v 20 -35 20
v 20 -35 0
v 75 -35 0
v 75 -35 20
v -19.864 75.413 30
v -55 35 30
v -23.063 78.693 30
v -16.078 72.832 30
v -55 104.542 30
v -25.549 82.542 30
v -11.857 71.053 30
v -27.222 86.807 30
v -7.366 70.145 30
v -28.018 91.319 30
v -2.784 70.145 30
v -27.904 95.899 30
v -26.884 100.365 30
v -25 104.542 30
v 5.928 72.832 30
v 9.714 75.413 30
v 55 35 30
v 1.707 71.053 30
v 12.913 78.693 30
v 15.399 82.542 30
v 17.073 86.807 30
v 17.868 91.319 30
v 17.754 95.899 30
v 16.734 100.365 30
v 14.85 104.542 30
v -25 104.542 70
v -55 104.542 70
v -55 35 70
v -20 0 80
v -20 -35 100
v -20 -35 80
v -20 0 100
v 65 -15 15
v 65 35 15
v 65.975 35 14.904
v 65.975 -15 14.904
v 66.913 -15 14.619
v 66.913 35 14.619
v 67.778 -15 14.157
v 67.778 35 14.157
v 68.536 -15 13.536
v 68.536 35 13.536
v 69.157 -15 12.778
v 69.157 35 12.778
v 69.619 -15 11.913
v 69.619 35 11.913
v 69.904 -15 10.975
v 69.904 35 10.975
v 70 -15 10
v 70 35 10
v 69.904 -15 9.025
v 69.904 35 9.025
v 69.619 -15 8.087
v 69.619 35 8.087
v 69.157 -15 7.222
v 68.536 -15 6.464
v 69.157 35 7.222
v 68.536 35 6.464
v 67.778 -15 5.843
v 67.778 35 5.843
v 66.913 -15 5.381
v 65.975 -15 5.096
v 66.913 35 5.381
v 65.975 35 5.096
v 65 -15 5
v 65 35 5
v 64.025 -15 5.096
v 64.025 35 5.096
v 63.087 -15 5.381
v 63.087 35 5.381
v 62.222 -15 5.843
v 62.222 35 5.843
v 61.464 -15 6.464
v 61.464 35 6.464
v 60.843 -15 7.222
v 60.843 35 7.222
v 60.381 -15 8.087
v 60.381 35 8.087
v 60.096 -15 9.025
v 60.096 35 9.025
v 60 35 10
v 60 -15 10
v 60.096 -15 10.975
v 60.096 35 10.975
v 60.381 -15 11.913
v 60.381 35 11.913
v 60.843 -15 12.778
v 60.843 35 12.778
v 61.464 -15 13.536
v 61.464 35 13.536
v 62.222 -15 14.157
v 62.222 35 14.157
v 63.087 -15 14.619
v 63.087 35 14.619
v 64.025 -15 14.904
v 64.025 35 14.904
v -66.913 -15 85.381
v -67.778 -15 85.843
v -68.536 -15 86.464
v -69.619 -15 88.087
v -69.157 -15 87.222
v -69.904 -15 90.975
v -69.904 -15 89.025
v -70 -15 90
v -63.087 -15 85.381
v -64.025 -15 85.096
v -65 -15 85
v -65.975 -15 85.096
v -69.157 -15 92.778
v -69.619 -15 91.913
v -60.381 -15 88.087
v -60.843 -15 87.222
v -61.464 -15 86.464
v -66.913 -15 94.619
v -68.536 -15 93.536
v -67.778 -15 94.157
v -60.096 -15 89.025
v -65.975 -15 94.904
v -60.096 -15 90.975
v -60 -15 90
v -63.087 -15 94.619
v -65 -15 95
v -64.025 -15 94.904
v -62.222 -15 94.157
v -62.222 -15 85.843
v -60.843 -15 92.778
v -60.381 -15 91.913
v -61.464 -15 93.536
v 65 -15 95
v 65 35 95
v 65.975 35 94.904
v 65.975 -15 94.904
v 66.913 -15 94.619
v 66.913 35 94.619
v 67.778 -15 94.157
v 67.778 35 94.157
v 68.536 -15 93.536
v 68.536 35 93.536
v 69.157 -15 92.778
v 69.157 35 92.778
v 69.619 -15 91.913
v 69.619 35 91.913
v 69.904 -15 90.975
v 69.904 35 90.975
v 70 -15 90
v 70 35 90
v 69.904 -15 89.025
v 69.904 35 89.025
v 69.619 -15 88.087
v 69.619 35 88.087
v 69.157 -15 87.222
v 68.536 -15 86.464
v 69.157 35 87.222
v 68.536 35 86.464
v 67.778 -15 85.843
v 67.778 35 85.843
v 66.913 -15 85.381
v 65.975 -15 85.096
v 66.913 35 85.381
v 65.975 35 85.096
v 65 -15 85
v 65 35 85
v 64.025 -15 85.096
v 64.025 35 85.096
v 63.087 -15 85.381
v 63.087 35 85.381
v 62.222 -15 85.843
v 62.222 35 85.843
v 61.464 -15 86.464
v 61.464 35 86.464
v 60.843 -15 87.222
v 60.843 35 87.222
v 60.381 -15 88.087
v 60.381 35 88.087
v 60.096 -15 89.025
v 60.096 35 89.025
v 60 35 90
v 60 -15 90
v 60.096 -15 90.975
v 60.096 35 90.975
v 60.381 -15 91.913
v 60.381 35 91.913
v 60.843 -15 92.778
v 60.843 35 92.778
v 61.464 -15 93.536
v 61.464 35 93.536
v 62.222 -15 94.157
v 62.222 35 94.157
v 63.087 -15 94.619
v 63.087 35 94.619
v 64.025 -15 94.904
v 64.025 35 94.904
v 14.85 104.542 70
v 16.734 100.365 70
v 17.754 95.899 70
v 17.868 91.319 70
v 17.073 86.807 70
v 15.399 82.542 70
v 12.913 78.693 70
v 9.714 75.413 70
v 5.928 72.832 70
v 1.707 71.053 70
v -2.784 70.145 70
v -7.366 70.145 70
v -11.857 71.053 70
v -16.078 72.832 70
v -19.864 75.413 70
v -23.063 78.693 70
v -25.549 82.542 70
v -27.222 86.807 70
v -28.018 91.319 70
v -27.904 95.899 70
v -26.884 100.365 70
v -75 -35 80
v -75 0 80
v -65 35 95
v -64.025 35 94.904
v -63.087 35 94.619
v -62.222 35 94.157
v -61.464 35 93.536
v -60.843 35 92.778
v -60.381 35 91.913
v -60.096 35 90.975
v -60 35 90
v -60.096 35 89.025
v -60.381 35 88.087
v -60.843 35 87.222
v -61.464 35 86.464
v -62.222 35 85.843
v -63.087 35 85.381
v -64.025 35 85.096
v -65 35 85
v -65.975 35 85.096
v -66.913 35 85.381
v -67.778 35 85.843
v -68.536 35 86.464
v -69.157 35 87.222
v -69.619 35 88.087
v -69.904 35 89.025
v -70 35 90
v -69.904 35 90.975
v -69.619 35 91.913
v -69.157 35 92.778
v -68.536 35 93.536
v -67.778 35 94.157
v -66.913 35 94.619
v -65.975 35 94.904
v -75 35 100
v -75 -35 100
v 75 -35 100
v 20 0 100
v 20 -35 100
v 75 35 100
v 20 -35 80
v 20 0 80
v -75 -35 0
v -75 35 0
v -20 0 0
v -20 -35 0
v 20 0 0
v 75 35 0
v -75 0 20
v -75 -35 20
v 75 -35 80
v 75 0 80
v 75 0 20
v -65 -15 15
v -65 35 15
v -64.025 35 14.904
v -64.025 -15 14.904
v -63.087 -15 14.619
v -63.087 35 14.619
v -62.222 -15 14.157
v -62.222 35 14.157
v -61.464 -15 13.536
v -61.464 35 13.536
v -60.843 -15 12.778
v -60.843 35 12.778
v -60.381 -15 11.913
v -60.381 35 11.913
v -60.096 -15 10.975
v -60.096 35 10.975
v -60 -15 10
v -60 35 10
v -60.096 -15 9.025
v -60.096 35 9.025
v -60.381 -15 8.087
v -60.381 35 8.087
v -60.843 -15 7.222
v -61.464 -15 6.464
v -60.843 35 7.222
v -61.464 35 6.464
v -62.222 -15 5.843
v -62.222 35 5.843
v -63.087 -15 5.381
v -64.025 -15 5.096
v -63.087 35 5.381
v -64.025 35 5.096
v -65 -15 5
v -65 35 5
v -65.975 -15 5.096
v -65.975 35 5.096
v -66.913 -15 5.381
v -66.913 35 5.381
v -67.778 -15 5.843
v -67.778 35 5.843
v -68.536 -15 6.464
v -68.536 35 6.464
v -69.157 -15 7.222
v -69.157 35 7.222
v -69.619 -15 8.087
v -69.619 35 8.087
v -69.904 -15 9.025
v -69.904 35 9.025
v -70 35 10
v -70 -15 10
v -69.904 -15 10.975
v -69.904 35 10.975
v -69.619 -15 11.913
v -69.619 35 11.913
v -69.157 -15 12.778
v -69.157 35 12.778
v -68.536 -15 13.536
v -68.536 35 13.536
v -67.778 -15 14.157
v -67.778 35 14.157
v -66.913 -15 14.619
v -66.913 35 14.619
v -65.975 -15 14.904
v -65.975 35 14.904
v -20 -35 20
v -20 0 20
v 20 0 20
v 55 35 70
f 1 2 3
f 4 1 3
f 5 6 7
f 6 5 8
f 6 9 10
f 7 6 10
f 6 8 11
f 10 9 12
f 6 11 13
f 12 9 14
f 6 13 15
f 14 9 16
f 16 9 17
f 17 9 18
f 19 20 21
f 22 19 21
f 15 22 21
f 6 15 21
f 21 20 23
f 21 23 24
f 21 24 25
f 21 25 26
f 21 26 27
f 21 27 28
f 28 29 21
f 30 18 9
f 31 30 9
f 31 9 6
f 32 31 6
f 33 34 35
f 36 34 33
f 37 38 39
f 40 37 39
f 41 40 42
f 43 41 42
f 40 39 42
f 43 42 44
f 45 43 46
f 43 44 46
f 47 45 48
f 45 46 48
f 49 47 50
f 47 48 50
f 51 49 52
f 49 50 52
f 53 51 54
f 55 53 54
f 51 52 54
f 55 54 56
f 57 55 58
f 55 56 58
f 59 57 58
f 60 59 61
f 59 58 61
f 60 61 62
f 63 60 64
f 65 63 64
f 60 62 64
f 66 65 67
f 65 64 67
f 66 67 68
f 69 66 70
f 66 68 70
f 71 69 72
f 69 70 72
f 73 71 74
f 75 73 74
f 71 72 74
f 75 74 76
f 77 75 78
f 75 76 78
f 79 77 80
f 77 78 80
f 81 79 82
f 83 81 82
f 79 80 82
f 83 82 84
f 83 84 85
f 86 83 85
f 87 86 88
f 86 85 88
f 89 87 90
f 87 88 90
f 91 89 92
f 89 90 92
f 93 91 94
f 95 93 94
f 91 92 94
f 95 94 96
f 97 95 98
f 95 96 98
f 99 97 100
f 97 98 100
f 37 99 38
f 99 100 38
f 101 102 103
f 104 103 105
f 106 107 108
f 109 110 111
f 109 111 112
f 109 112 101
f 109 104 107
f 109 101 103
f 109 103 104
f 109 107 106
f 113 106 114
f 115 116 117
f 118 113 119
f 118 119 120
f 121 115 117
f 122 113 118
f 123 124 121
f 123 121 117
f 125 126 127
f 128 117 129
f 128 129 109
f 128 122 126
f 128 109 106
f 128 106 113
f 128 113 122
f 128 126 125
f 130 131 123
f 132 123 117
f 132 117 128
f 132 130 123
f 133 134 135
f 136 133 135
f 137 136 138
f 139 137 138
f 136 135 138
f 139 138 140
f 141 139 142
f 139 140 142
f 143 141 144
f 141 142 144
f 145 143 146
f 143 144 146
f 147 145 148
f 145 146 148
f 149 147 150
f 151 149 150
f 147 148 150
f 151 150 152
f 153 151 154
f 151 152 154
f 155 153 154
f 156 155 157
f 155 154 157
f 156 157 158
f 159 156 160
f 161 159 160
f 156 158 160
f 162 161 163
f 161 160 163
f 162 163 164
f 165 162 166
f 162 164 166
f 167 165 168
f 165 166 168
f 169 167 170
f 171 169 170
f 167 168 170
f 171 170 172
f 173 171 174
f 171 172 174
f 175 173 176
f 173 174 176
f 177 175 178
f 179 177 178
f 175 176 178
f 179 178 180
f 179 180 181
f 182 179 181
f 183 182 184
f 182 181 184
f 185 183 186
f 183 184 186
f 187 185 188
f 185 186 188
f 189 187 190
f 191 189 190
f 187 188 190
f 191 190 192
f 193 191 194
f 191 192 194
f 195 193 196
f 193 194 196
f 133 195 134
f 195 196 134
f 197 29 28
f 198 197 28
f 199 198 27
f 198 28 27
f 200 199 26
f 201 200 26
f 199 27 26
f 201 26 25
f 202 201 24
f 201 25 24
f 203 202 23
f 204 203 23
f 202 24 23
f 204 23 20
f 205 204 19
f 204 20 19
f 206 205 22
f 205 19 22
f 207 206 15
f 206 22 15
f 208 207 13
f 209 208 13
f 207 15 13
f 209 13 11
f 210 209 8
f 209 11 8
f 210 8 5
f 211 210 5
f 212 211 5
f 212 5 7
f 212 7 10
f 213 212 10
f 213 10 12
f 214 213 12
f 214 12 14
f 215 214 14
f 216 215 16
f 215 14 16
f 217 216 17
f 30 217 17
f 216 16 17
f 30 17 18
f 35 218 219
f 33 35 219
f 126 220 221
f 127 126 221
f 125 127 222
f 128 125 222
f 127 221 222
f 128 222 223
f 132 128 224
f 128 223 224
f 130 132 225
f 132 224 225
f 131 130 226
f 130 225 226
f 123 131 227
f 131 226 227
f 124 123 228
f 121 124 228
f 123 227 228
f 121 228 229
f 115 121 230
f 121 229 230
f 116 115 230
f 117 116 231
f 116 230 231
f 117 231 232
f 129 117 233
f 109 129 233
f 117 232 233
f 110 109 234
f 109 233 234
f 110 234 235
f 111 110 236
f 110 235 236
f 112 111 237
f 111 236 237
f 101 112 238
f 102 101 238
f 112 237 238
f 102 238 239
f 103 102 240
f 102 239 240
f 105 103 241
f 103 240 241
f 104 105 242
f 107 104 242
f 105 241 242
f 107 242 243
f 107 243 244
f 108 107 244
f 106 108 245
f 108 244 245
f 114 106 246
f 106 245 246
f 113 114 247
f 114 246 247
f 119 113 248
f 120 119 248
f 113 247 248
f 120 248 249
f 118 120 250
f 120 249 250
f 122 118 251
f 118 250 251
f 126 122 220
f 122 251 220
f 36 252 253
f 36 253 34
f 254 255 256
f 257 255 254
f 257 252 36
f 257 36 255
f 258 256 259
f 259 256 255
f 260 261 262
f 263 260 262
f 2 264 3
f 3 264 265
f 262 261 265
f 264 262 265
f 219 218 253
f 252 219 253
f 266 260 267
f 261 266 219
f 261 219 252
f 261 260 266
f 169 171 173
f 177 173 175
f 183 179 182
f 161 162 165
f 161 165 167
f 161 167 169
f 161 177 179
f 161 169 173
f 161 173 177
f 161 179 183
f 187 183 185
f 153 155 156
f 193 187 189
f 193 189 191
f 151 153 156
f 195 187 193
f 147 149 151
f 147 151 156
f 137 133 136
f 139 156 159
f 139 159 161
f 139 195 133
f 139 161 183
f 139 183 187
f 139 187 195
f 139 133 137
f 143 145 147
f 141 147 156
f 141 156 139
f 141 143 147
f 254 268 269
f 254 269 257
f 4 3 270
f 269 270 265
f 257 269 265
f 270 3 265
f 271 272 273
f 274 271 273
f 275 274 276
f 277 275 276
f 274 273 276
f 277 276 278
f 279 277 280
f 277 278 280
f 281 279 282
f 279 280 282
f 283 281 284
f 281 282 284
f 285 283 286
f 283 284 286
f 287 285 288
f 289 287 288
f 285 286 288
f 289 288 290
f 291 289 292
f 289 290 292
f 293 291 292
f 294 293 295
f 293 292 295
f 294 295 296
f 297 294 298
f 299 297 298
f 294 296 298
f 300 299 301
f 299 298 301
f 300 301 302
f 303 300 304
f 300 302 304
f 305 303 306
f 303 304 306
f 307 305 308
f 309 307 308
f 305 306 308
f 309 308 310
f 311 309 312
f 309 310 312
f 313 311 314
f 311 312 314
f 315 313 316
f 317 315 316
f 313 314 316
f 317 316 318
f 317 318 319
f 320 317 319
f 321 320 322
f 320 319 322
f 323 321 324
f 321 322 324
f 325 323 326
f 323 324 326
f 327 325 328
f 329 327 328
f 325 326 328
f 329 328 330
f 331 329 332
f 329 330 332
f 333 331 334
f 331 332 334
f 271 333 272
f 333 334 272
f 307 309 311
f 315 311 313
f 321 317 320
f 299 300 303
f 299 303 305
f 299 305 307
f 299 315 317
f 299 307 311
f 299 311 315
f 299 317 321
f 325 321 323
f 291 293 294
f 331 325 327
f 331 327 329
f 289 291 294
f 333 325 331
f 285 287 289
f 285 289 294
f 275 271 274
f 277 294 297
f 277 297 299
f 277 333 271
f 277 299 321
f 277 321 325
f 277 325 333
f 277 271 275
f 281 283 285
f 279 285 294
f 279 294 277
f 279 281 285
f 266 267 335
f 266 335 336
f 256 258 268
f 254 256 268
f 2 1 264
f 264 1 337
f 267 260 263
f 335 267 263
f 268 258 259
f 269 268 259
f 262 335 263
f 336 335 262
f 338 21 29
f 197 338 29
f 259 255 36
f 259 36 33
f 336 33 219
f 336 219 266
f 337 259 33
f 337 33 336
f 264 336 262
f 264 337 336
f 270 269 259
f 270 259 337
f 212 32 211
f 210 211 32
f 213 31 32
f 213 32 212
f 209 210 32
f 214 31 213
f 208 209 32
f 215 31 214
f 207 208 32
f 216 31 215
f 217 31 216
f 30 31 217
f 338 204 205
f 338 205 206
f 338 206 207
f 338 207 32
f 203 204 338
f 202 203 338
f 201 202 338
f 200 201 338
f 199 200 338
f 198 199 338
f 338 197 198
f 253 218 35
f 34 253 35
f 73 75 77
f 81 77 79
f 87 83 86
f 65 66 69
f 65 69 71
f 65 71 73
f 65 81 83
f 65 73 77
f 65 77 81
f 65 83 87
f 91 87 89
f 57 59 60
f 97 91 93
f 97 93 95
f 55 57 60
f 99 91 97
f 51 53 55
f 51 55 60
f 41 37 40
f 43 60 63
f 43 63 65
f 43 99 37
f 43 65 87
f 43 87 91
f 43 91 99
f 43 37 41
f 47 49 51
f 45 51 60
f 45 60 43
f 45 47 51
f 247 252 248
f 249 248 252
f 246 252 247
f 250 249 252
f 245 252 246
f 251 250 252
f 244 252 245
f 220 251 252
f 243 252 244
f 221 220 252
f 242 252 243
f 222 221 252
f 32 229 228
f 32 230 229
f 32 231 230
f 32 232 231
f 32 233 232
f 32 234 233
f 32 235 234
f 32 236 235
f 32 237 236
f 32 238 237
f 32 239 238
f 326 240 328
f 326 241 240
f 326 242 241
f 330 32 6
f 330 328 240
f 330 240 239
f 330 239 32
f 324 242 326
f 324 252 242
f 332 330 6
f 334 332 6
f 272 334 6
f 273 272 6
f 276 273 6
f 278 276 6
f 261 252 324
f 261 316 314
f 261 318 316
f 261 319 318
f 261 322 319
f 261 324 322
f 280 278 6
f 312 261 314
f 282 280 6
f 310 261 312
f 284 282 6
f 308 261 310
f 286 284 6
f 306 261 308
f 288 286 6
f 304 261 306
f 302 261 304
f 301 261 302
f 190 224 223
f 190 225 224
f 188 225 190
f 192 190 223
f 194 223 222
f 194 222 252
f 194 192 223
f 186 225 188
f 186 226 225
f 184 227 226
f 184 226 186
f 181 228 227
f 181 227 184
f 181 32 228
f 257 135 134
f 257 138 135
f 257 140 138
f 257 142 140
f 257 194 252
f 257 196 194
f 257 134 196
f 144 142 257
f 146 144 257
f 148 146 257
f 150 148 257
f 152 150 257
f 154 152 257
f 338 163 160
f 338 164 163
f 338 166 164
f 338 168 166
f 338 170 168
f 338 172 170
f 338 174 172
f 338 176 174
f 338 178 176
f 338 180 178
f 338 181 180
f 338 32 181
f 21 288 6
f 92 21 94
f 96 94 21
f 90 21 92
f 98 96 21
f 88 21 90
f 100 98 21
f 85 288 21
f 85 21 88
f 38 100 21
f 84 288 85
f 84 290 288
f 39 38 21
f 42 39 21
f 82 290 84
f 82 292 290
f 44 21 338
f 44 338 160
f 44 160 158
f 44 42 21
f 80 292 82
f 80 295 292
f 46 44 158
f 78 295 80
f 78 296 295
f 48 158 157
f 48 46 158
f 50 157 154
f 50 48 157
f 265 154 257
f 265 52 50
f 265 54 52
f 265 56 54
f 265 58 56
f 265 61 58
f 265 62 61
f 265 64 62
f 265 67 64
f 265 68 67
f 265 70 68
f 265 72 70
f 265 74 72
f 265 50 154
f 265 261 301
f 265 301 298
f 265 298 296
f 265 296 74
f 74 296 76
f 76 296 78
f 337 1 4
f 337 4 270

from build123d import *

# Parameters (mm, degrees)
SKETCH1_W                = 150
SKETCH1_H                = 70
BOSS_EXTRUDE1_DEPTH      = 100
SKETCH2_W                = 40
SKETCH2_H                = 35
CUT_EXTRUDE1_DEPTH       = 100
SKETCH3_W                = 60
SKETCH3_H                = 35
CUT_EXTRUDE2_DEPTH       = 150
BOSS_EXTRUDE2_DEPTH      = 20
BOSS_EXTRUDE2_DEPTH_BACK = 20
SKETCH11_R               = 5
CUT_EXTRUDE4_DEPTH       = 50


with BuildPart() as part:
    # Sketch1 → Boss-Extrude1 (new body)
    with BuildSketch(Plane.XY):
        Rectangle(SKETCH1_W, SKETCH1_H)
    extrude(amount=BOSS_EXTRUDE1_DEPTH)

    # Sketch2 → Cut-Extrude1 (cut)
    with BuildSketch(Plane.XY.offset(100)):
        with Locations((0, -17.5)):
            Rectangle(SKETCH2_W, SKETCH2_H)
    extrude(amount=-CUT_EXTRUDE1_DEPTH, mode=Mode.SUBTRACT)

    # Sketch3 → Cut-Extrude2 (cut)
    with BuildSketch(Plane(origin=(75, 0, 0), x_dir=(0, 0, -1), z_dir=(1, 0, 0))):
        with Locations((-50, -17.5)):
            Rectangle(SKETCH3_W, SKETCH3_H)
    extrude(amount=-CUT_EXTRUDE2_DEPTH, mode=Mode.SUBTRACT)

    # Sketch5 → Boss-Extrude2 (add, two sides: drawn at the far end of the back side and taken through both)
    with BuildSketch(Plane.XY.offset(50).offset(-BOSS_EXTRUDE2_DEPTH_BACK)):
        with BuildLine():
            Line((55, 35), (14.850112855, 104.541644453))
            ThreePointArc((14.850112855, 104.541644453), (-5.074943572, 70.030434377), (-25, 104.541644453))
            Line((-25, 104.541644453), (-55, 104.541644453))
            Line((-55, 104.541644453), (-55, 35))
            Line((-55, 35), (55, 35))
        make_face()
    extrude(amount=BOSS_EXTRUDE2_DEPTH + BOSS_EXTRUDE2_DEPTH_BACK)

    # Sketch11 → Cut-Extrude4 (cut)
    with BuildSketch(Plane(origin=(0, 35, 0), x_dir=(1, 0, 0), z_dir=(0, 1, 0))):
        with Locations(Location((65, -10, 0), (0, 0, 270))):
            Circle(SKETCH11_R)
        with Locations(Location((-65, -10, 0), (0, 0, 270))):
            Circle(SKETCH11_R)
        with Locations(Location((-65, -90, 0), (0, 0, 270))):
            Circle(SKETCH11_R)
        with Locations(Location((65, -90, 0), (0, 0, 270))):
            Circle(SKETCH11_R)
    extrude(amount=-CUT_EXTRUDE4_DEPTH, mode=Mode.SUBTRACT)


solid = part.part
